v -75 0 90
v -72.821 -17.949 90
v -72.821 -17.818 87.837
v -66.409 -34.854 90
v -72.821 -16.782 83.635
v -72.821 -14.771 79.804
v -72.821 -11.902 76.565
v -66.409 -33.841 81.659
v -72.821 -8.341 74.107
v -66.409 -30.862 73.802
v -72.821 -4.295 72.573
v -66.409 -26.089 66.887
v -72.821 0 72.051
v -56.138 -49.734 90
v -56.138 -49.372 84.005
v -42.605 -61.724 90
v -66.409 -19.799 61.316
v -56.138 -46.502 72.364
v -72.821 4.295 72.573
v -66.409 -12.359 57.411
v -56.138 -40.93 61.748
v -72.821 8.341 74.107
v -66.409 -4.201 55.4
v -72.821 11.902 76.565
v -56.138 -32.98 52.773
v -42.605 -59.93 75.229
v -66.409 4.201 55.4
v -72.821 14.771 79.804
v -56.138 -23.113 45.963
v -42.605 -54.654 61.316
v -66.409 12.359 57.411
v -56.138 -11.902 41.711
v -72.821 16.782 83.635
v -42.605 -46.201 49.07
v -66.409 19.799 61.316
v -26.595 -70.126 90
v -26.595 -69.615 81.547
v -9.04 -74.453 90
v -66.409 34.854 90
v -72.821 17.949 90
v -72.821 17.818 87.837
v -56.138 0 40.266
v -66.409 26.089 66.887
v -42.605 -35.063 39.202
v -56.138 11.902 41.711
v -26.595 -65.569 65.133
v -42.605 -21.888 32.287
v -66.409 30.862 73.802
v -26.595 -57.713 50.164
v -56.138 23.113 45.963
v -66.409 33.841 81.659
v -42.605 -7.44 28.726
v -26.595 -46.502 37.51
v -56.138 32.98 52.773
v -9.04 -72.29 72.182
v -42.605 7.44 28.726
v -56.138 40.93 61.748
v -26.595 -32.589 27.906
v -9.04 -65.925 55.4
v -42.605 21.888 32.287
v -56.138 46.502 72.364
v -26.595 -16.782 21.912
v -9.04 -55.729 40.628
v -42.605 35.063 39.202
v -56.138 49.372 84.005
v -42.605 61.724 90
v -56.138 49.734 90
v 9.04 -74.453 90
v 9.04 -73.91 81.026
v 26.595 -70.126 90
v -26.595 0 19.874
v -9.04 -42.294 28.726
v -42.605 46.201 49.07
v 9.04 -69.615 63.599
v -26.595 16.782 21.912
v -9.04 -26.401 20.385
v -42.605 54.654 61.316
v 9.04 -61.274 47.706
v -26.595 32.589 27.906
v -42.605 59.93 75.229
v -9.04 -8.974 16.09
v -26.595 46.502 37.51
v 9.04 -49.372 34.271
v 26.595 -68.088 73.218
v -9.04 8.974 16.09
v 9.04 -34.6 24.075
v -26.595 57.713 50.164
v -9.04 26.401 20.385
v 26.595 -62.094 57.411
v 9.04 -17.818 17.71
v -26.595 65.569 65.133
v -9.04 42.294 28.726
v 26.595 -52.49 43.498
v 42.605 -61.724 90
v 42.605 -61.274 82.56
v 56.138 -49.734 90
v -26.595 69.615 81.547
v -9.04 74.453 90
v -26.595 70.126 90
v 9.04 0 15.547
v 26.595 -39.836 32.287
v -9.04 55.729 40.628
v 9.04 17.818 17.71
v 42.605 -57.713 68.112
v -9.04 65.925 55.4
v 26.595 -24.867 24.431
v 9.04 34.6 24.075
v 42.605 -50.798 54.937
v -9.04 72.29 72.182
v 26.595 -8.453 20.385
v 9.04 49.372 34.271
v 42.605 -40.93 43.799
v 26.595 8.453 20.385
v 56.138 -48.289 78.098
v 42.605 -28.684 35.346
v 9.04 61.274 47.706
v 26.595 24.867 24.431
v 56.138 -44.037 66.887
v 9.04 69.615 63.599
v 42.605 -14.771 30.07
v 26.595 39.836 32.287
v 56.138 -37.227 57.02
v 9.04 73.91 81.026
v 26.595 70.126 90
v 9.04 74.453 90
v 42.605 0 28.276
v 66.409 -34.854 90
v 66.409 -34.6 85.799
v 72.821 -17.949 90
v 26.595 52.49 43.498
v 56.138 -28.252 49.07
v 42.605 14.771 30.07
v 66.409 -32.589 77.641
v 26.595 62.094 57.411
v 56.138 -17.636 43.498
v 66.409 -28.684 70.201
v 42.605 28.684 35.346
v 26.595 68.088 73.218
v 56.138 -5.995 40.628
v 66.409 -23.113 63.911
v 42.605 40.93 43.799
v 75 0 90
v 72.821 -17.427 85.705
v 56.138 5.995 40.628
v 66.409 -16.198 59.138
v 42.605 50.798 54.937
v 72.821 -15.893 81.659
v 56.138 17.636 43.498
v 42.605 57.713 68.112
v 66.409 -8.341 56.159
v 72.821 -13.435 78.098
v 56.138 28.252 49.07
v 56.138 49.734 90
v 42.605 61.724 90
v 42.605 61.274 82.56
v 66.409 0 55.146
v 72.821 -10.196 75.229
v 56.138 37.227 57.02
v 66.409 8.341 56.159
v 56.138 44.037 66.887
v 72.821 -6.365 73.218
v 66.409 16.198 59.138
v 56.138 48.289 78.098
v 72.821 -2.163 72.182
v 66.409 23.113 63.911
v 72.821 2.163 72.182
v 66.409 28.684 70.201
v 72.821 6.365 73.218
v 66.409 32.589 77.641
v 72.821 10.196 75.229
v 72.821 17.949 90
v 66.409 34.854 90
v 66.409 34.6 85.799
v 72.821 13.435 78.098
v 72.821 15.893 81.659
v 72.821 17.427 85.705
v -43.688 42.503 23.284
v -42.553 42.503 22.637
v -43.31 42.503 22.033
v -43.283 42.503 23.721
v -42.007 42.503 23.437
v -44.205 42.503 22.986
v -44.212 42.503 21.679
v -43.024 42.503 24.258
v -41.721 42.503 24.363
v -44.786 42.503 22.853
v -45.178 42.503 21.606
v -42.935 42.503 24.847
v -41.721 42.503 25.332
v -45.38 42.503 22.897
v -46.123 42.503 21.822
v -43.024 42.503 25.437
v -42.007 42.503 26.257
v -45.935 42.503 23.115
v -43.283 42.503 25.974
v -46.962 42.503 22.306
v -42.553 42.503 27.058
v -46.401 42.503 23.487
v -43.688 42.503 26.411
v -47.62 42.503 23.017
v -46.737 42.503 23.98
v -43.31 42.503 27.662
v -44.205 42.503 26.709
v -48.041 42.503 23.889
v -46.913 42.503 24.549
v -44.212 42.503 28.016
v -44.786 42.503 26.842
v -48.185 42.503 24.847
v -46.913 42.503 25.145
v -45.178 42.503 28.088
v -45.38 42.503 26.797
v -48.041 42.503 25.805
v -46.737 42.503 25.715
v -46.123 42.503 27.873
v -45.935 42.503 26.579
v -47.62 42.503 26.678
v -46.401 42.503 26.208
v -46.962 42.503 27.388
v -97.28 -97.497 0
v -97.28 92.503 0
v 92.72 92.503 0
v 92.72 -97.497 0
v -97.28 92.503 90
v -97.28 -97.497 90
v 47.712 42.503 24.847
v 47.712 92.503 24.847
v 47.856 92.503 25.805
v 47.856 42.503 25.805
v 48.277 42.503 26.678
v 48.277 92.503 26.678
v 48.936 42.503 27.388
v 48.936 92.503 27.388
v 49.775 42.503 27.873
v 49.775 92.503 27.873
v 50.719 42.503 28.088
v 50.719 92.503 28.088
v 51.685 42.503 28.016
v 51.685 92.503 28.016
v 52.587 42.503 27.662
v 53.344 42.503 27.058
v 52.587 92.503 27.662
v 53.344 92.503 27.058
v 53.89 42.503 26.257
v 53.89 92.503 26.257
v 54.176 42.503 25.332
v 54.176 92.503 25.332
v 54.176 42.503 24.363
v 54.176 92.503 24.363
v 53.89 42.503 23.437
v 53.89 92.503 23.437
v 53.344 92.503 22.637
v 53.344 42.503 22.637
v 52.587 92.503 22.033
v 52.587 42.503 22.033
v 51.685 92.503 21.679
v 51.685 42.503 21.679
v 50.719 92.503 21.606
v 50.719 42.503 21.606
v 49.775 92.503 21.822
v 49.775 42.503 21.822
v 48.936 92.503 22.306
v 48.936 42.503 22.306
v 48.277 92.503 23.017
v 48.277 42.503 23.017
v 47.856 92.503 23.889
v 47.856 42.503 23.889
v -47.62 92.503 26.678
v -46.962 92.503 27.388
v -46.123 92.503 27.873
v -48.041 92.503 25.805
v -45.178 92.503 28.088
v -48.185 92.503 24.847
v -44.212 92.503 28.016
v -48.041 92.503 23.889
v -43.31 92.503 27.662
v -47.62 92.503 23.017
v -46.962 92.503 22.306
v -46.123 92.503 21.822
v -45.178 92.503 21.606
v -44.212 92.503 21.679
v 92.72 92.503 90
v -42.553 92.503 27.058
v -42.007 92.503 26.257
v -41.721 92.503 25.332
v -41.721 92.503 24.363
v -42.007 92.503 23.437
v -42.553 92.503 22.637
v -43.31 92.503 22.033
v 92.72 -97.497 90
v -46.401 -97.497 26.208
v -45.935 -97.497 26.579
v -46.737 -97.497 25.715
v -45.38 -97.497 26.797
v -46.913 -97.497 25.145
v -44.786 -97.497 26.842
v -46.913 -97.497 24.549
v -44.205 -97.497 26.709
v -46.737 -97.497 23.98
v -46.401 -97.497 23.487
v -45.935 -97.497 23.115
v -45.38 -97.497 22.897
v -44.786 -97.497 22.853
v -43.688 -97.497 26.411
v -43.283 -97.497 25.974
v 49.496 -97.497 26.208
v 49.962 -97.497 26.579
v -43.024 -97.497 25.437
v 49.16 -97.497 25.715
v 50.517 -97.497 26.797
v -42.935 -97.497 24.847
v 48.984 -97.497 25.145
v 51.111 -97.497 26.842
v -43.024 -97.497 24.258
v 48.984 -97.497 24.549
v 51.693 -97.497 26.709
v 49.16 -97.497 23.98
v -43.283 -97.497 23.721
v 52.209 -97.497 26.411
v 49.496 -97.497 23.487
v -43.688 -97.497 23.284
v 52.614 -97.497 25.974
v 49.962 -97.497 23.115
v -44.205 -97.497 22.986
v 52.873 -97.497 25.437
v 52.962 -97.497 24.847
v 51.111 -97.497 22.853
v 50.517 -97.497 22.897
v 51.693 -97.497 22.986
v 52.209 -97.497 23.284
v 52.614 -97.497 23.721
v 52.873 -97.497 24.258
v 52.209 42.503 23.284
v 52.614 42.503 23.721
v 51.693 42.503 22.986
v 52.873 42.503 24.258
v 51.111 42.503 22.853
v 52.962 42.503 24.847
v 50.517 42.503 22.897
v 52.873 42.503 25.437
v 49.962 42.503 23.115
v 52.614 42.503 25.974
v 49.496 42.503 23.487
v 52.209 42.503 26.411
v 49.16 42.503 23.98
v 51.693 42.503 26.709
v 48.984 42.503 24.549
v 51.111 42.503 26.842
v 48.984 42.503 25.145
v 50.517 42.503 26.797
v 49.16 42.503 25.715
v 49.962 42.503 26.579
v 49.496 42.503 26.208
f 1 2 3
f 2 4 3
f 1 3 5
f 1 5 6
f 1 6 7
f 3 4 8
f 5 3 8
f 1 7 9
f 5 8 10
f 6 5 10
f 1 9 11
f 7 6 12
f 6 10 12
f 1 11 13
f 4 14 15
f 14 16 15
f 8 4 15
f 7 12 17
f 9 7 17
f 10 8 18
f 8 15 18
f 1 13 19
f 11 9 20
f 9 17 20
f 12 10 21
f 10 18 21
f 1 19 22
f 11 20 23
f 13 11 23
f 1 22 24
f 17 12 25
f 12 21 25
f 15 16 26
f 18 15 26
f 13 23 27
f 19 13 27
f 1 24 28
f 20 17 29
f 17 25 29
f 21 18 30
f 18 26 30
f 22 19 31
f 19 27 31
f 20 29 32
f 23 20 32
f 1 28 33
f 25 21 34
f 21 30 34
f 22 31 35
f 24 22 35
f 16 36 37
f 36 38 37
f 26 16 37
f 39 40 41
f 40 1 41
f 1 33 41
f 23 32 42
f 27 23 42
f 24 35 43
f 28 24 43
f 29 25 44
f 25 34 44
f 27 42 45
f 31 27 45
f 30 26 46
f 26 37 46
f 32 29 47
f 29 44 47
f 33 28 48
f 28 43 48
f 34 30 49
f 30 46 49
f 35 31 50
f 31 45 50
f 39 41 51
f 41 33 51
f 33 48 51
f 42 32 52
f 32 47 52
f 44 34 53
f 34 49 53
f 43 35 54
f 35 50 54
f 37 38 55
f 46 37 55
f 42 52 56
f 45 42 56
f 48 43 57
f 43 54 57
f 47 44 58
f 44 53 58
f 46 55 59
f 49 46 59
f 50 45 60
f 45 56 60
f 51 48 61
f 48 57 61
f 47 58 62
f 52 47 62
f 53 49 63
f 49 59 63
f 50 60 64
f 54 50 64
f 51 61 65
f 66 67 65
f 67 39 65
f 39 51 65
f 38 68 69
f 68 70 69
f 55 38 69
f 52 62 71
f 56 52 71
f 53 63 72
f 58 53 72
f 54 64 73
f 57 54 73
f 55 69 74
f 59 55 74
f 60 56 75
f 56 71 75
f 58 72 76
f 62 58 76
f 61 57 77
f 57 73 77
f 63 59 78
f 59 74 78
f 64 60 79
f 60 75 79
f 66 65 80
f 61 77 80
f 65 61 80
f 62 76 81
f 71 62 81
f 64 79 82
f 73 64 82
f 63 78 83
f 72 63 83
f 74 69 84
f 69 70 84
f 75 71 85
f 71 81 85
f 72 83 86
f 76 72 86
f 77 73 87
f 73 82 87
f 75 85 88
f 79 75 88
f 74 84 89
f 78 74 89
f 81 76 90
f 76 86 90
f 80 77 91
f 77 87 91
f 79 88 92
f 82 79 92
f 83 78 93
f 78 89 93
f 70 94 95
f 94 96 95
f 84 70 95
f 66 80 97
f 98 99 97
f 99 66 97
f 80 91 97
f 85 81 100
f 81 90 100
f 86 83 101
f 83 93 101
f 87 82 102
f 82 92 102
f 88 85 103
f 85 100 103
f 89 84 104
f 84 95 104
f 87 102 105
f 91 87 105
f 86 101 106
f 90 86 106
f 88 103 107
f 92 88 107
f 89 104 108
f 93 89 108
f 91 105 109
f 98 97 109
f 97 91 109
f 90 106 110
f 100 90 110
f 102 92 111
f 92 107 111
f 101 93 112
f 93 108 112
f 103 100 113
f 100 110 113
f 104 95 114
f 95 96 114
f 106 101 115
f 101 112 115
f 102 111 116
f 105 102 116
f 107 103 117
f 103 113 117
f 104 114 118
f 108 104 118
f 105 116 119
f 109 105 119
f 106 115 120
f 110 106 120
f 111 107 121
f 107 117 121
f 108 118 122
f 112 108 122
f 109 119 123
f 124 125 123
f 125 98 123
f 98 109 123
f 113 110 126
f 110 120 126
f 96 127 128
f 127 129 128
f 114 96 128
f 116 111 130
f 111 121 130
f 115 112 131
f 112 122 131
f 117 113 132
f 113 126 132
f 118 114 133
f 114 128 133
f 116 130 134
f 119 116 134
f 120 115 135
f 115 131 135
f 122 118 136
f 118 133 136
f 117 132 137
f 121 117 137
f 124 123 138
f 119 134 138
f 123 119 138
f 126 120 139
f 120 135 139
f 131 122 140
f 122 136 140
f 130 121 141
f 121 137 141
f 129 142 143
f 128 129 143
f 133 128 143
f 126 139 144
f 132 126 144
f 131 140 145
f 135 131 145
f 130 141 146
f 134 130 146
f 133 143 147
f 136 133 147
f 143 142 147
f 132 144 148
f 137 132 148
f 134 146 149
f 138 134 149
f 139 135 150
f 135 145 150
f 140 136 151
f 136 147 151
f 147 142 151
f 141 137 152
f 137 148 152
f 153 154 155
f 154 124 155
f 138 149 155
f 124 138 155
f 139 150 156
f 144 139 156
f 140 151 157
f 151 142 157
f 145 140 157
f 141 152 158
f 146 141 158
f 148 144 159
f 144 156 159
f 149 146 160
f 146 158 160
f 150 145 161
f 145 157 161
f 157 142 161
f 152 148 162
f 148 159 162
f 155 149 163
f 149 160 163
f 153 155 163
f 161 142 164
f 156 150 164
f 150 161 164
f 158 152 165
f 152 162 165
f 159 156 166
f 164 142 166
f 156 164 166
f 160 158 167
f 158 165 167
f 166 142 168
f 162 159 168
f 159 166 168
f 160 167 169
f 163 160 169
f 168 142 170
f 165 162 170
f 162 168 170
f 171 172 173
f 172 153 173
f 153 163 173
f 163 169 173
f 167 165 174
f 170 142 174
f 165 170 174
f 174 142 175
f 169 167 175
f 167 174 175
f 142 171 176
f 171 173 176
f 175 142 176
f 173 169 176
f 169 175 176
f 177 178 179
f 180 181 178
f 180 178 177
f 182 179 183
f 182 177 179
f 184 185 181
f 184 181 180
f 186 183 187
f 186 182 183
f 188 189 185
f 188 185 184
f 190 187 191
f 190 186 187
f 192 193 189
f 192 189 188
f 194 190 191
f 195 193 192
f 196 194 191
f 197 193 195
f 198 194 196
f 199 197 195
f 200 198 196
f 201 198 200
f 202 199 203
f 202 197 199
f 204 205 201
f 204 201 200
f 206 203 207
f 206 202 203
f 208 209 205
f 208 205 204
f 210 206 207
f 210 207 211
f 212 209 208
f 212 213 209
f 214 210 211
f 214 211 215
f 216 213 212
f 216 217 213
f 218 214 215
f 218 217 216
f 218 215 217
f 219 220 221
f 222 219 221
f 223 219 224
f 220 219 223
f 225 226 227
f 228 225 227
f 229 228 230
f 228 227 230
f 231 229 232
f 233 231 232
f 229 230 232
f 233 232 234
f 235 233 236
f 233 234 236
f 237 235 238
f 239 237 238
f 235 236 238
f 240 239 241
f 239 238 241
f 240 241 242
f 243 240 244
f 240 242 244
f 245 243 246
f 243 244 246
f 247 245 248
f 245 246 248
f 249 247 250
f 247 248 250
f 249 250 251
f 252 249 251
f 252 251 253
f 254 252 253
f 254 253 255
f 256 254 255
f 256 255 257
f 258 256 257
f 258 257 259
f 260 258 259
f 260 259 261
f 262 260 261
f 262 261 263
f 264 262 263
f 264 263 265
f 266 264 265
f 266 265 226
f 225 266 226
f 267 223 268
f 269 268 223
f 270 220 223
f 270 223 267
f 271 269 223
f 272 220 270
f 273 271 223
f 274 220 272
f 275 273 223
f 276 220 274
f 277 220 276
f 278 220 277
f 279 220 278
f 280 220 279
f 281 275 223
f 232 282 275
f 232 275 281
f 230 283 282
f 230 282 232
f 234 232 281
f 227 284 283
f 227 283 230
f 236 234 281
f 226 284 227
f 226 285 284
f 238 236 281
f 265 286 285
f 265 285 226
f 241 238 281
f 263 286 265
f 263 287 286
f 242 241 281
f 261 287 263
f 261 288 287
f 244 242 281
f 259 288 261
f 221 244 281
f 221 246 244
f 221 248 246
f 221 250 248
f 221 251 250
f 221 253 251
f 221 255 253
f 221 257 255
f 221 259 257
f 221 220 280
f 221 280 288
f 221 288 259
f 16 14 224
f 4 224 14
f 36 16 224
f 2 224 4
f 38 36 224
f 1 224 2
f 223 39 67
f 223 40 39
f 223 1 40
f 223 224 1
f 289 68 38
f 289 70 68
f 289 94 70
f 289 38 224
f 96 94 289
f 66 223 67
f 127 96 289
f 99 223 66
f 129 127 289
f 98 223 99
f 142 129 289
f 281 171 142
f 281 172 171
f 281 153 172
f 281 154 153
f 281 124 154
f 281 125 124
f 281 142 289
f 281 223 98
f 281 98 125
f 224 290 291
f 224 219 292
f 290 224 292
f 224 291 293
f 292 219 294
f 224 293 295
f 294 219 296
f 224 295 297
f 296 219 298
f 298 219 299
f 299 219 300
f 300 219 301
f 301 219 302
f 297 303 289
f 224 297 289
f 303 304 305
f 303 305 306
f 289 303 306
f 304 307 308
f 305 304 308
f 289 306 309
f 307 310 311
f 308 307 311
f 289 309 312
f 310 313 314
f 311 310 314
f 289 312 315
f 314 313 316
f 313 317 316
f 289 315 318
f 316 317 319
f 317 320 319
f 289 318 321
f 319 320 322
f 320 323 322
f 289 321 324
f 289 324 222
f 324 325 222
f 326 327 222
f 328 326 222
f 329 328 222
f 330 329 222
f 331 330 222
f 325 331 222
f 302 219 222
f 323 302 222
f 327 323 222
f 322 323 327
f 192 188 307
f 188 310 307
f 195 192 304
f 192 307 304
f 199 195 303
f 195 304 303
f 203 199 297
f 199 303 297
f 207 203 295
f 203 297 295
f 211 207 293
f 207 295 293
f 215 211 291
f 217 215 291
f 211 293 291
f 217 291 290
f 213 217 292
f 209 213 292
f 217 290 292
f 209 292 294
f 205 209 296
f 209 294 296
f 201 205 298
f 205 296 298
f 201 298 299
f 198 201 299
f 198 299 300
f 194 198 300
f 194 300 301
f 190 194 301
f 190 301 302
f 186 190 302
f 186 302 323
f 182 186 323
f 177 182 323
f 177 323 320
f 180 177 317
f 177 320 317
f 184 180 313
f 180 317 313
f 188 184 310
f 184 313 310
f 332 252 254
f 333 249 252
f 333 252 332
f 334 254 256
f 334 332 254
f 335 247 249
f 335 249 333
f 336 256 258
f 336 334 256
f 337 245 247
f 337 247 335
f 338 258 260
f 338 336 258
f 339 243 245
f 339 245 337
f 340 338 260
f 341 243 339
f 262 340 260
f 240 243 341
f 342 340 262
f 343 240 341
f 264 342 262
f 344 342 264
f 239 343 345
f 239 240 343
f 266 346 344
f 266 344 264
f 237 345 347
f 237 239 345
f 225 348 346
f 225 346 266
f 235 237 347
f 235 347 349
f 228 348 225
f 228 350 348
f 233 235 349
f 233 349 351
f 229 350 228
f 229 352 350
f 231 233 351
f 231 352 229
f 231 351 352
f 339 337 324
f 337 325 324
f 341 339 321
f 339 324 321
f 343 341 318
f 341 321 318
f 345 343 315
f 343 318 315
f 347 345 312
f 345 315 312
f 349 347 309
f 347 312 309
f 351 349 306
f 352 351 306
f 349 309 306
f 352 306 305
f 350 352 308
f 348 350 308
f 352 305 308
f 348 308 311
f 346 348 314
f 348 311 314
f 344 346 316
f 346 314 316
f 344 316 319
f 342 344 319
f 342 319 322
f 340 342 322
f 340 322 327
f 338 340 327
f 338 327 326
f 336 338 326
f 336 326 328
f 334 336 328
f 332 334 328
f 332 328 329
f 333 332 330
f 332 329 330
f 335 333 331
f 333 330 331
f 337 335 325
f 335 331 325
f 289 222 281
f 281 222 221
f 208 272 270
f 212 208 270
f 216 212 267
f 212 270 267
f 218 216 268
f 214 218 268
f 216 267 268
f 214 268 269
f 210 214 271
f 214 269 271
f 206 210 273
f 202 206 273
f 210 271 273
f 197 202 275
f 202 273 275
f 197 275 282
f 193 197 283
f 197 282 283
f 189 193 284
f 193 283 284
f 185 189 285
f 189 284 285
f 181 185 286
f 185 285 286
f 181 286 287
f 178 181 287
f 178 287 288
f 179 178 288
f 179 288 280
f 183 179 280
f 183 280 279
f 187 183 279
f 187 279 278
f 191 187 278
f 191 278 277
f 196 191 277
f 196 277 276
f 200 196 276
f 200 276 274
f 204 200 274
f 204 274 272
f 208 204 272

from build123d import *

# Parameters (mm, degrees)
F0_W           = 190
F0_H           = 190
F1_DEPTH       = 90
F5_D           = 4
F5_CBORE_D     = 6.5
F5_CBORE_DEPTH = 50


with BuildPart() as f1:
    # F0 (on Top) → F1 (new body)
    with BuildSketch(Plane.XY):
        with Locations((-2.279991, -2.496977)):
            Rectangle(F0_W, F0_H)
    extrude(amount=F1_DEPTH)

    # F2 (on face) → F3 (revolve, cut)
    with BuildSketch(Plane.XY.offset(90)):
        with BuildLine():
            Line((75, 0), (-75, 0))
            ThreePointArc((-75, 0), (0, -75), (75, 0))
        make_face()
    revolve(axis=Axis((0, 0, 90), (1, 0, 0)), mode=Mode.SUBTRACT)

    # F5 (through all)
    with Locations(Plane(origin=(0, 92.503023, 0), x_dir=(-1, 0, 0), z_dir=(0, 1, 0))):
        with Locations((44.935185, 24.847355), (-50.961897, 24.847355)):
            CounterBoreHole(F5_D / 2, F5_CBORE_D / 2, F5_CBORE_DEPTH)


solid = f1.part
